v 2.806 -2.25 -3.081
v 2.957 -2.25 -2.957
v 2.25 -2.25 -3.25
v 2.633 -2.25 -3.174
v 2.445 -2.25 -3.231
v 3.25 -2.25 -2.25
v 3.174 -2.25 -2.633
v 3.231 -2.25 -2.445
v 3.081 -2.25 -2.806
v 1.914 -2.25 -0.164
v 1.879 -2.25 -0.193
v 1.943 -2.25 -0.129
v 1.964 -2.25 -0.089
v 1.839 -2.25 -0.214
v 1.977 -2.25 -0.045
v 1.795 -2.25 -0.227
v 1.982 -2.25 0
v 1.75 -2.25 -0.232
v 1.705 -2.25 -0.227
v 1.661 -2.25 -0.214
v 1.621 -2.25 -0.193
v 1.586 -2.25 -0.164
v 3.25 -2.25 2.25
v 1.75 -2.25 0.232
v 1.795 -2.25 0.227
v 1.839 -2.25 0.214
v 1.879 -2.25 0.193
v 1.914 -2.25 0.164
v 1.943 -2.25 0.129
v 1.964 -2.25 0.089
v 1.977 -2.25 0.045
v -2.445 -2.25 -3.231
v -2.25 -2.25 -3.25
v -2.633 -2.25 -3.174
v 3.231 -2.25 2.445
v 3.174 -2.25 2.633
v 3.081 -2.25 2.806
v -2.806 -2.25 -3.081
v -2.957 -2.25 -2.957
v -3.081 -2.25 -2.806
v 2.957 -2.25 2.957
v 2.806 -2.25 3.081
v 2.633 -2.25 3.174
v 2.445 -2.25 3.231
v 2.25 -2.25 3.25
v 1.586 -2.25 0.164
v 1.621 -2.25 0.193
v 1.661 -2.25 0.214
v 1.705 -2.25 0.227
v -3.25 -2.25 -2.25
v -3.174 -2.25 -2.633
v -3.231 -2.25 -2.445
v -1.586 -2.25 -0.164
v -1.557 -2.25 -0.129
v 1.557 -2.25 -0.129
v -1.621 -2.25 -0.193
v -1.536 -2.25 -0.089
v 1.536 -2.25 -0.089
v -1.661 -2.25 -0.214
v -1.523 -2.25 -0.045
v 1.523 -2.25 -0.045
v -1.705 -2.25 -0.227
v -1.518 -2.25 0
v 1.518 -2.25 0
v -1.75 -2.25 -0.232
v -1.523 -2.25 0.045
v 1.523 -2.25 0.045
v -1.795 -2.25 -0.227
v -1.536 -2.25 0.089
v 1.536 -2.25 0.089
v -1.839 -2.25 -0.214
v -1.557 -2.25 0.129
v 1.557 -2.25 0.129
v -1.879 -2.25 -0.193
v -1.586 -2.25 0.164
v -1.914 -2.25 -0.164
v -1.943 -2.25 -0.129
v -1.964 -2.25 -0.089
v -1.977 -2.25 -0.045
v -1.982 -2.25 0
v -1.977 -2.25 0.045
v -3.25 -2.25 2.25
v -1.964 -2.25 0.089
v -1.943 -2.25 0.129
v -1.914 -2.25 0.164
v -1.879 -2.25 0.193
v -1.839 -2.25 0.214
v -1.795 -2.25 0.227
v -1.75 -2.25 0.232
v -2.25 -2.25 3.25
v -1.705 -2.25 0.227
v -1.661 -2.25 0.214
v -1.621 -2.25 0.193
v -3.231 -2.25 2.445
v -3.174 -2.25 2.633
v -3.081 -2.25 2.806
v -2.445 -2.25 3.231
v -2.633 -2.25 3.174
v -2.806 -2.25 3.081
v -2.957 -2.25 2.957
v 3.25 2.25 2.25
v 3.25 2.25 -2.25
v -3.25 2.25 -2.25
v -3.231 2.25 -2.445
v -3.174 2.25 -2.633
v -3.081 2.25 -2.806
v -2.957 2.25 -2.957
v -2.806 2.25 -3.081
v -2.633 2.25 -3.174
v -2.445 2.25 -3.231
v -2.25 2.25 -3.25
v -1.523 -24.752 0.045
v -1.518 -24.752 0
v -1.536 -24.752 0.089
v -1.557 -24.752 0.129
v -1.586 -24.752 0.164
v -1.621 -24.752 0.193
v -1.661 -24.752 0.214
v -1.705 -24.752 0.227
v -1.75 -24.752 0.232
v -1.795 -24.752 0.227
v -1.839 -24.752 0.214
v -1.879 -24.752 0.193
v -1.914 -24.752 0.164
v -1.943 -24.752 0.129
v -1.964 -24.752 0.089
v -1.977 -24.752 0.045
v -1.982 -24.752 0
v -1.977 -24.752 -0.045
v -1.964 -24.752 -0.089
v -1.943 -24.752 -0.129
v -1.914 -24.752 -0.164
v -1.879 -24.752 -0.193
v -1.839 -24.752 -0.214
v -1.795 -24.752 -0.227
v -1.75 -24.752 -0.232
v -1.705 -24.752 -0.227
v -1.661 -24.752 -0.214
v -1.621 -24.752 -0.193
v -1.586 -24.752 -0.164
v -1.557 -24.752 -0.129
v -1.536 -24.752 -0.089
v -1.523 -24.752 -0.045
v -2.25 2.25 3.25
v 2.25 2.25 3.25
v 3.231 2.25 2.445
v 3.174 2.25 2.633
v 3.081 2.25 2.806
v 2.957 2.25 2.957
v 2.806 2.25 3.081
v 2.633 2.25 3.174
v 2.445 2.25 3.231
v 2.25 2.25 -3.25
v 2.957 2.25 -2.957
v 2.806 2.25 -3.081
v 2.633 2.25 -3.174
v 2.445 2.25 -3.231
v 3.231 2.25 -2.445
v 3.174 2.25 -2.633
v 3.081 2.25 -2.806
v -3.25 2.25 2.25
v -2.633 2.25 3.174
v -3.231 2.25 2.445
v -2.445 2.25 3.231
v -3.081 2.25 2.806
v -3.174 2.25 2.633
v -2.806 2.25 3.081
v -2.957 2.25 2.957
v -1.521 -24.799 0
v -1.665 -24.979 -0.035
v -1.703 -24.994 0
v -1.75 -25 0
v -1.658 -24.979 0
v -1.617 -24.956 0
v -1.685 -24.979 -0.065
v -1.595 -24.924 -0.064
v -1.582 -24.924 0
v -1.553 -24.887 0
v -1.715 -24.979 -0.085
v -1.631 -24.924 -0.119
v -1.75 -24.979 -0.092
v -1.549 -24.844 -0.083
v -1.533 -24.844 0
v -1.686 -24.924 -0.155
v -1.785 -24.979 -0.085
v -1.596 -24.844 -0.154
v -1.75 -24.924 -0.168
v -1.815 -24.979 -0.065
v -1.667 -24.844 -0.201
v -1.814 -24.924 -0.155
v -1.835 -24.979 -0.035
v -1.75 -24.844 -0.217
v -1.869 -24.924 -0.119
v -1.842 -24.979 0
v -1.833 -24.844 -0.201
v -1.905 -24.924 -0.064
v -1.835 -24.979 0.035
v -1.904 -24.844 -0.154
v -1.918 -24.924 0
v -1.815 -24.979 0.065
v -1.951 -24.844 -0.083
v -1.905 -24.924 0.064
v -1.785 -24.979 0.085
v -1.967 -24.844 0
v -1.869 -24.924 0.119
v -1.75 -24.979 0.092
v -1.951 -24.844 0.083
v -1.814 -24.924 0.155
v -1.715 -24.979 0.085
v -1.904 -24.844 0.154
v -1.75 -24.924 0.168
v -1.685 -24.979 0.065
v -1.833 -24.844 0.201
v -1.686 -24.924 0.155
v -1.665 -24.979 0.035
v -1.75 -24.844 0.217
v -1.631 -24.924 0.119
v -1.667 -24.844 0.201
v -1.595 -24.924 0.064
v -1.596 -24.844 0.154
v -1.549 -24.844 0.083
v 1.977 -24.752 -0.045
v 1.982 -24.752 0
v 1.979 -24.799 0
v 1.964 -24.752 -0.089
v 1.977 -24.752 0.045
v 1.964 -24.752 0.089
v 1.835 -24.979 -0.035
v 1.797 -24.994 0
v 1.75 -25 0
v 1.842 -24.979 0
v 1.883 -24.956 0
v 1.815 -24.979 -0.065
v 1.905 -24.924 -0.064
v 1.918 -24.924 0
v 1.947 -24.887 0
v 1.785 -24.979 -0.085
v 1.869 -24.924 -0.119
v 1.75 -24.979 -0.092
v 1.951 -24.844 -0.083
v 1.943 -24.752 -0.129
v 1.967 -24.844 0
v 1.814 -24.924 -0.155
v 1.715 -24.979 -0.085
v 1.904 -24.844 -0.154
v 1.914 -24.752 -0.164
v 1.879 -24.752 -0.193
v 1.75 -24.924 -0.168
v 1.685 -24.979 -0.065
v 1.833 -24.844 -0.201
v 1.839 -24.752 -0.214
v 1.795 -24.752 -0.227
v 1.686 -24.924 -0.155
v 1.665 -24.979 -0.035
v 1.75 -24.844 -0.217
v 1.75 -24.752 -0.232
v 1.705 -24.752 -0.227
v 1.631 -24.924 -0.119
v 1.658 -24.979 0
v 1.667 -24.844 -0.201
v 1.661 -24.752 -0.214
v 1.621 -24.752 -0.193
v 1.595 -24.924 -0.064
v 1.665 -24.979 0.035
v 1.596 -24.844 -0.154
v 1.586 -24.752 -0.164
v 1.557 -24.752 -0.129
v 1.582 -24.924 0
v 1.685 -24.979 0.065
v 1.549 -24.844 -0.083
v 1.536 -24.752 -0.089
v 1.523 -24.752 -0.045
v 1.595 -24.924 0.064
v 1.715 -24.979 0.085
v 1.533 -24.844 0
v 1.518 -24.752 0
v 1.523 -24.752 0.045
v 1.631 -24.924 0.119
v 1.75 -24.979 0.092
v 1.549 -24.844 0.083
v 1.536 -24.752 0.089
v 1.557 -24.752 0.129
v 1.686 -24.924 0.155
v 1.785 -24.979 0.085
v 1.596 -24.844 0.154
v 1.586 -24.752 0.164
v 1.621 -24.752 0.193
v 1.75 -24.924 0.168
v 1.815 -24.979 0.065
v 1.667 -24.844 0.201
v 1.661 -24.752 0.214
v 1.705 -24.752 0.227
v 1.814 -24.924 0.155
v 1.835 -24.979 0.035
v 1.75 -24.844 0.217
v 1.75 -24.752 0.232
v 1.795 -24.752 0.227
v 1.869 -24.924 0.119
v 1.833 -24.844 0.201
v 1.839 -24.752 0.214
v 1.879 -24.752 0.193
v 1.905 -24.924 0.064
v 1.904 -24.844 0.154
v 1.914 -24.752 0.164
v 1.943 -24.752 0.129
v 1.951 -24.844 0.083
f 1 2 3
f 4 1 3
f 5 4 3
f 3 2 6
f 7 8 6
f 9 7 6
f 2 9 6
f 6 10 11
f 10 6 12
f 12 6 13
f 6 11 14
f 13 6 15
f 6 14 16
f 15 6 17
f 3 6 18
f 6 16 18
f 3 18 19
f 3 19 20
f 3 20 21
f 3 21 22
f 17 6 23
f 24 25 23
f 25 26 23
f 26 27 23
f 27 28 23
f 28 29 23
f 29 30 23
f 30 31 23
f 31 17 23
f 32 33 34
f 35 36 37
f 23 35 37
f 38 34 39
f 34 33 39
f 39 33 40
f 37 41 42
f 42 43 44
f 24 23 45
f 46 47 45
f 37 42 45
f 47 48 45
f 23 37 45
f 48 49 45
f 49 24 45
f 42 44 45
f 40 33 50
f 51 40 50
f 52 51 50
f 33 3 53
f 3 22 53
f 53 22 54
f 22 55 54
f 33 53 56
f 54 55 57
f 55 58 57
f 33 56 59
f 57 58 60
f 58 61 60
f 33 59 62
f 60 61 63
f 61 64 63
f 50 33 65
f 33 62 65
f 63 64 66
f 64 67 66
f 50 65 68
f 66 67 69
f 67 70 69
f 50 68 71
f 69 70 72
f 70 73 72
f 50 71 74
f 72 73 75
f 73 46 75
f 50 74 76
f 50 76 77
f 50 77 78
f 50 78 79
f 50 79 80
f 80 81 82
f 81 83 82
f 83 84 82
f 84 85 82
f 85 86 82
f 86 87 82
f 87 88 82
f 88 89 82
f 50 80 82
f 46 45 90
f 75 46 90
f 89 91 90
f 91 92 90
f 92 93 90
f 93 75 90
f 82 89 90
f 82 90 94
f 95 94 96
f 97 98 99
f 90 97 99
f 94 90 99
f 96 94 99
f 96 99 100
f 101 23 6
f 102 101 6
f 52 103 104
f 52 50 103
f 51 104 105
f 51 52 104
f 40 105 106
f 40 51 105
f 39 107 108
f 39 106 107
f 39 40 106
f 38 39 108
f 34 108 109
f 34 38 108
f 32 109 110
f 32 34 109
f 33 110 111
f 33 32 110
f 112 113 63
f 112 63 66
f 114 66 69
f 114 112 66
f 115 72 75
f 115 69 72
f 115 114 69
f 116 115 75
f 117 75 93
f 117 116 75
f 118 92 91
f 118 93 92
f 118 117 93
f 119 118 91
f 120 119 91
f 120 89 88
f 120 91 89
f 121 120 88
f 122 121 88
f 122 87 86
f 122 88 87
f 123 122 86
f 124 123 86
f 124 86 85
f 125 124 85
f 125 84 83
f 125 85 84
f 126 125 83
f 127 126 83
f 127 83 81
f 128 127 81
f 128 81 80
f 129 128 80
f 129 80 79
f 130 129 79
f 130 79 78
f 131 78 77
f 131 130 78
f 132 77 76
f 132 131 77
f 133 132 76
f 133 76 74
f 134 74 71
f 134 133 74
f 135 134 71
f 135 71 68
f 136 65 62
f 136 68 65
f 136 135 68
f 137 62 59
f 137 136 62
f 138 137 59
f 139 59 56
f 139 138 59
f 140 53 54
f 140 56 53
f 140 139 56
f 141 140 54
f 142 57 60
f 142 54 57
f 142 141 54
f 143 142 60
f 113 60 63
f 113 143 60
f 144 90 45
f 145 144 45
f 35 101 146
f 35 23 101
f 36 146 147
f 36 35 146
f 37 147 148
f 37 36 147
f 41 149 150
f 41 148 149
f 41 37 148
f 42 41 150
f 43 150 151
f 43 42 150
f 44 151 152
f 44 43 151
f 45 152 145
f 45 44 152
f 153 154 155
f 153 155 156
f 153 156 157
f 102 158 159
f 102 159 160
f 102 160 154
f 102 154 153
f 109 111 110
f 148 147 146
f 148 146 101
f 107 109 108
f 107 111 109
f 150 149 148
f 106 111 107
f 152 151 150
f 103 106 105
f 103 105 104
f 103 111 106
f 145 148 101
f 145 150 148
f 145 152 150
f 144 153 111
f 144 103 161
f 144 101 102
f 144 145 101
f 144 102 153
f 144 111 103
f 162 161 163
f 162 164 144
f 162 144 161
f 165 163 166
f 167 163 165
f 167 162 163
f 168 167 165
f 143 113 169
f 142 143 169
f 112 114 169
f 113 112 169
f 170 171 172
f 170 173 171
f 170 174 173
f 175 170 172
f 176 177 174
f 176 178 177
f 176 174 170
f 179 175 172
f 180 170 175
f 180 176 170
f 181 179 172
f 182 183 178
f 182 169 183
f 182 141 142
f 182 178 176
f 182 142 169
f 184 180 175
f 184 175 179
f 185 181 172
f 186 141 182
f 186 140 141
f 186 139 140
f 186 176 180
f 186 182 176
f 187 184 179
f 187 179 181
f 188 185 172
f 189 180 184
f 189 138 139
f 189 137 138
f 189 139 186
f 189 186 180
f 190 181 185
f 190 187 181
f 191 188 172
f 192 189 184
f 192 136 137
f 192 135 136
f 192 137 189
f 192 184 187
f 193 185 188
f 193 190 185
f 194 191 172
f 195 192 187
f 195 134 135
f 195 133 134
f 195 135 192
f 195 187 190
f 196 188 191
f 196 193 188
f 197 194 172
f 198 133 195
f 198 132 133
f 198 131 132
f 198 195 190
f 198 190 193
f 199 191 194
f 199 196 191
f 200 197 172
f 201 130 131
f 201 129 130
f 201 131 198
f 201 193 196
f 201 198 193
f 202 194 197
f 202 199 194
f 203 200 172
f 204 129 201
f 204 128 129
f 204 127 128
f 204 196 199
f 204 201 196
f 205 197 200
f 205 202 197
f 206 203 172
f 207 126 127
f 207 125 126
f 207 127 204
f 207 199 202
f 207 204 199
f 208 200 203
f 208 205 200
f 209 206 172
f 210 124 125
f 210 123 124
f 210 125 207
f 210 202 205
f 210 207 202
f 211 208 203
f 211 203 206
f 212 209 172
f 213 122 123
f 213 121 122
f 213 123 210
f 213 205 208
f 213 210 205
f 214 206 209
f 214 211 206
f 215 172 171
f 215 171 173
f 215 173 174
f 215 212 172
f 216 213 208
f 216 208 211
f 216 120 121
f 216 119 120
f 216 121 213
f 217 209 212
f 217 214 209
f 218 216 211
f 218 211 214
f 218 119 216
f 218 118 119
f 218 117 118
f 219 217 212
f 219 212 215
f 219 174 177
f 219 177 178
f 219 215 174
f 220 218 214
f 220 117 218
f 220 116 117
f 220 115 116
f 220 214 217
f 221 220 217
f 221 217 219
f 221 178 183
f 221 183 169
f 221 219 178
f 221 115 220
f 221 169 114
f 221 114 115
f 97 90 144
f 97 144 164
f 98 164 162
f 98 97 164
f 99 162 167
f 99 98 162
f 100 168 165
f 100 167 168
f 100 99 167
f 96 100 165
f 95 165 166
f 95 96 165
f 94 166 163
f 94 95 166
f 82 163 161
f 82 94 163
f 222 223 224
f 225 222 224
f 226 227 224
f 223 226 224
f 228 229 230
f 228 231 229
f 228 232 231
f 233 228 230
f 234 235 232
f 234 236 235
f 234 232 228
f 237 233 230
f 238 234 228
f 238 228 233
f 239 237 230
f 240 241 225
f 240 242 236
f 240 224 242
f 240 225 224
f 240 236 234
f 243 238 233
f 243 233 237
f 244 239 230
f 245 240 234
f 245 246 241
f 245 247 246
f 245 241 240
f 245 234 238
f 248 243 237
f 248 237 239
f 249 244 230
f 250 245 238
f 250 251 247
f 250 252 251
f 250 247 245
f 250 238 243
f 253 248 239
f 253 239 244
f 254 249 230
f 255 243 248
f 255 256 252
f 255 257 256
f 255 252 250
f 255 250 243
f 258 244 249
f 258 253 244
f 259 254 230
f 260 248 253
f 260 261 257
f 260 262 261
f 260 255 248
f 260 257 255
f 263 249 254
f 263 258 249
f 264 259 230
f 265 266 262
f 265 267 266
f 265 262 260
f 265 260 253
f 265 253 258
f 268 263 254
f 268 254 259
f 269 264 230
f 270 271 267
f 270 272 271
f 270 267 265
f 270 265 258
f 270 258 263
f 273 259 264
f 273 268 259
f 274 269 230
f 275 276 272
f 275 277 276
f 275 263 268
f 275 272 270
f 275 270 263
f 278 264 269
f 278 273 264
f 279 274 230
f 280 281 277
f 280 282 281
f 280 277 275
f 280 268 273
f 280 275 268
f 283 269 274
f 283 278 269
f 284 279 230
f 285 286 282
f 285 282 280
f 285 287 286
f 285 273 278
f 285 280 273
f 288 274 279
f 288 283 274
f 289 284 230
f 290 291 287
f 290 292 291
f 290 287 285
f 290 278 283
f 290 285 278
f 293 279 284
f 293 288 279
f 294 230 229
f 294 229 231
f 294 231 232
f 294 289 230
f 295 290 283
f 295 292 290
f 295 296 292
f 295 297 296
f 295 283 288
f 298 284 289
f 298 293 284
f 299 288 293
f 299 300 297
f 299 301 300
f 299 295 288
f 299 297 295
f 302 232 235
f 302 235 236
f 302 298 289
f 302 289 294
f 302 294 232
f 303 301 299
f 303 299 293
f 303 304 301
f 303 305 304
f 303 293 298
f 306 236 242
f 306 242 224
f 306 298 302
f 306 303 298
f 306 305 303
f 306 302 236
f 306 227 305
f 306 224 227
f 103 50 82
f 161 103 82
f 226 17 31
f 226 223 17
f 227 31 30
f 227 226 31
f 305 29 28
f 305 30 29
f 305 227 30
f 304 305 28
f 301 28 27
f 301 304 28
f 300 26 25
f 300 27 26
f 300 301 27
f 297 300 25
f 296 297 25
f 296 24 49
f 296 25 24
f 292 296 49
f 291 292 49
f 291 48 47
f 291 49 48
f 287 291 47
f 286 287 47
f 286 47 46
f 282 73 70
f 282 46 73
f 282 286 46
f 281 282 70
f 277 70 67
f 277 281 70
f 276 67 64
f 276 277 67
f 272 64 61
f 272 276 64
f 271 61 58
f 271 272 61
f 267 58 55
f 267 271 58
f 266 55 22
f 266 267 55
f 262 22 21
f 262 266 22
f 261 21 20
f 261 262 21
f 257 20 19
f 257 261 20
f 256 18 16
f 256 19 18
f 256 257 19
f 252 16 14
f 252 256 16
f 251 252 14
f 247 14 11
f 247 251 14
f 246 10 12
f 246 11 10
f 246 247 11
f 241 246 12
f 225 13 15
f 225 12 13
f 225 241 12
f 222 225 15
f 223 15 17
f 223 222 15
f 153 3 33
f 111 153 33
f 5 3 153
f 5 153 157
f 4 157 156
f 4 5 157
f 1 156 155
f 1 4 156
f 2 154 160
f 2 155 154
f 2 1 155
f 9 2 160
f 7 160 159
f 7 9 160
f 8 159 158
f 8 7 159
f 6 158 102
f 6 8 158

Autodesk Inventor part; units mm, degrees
ref_plane "YZ Plane" through (0, 0, 0) normal (1, 0, 0) x (0, 1, 0)
ref_plane "XZ Plane" through (0, 0, 0) normal (0, 1, 0) x (-1, 0, 0)
ref_plane "XY Plane" through (0, 0, 0) normal (0, 0, 1) x (1, 0, 0)
sketch "Sketch1" plane through (0, 0, 0) normal (0, 1, 0) x (-1, 0, 0)
  line L0 (2.25, 3.25) -> (-2.25, 3.25)
  line L1 (-3.25, 2.25) -> (-3.25, -2.25)
  line L2 (-2.25, -3.25) -> (2.25, -3.25)
  line L3 (3.25, -2.25) -> (3.25, 2.25)
  line L4 (3.25, 3.25) -> (-3.25, -3.25) construction
  line L5 (-3.25, 3.25) -> (3.25, -3.25) construction
  arc A0 (-3.25, -2.25) -> (-2.25, -3.25) centre (-2.25, -2.25) ccw
  arc A1 (2.25, -3.25) -> (3.25, -2.25) centre (2.25, -2.25) ccw
  arc A2 (3.25, 2.25) -> (2.25, 3.25) centre (2.25, 2.25) ccw
  arc A3 (-2.25, 3.25) -> (-3.25, 2.25) centre (-2.25, 2.25) ccw
  point P0 (0, 0)
  dimension "d0" = 6.5
  dimension "d1" = 6.5
  dimension "d4" = 1
extrude "Extrusion1" add sketch "Sketch1" along normal mid plane 4.5
sketch "Sketch4" plane through (0, 0, 0) normal (0, 0, 1) x (1, 0, 0)
  line L0 (-1.75, -25) -> (-1.75, -2.25)
  line L1 (-1.75, -2.25) -> (-1.5182, -2.25)
  line L2 (-1.5182, -2.25) -> (-1.5182, -24.7516)
  arc A0 (-1.75, -25) -> (-1.5182, -24.7516) centre (-1.7559, -24.7621) ccw
  point P0 (0, 0)
revolve "Revolution1" add sketch "Sketch4" angle 360 about axis through (-1.75, -25, 0) along (0, 1, 0)
pattern_linear "Rectangular Pattern3" count 2 spacing 3.5 along (1, 0, 0) of "Revolution1"
properties part number "A54"
